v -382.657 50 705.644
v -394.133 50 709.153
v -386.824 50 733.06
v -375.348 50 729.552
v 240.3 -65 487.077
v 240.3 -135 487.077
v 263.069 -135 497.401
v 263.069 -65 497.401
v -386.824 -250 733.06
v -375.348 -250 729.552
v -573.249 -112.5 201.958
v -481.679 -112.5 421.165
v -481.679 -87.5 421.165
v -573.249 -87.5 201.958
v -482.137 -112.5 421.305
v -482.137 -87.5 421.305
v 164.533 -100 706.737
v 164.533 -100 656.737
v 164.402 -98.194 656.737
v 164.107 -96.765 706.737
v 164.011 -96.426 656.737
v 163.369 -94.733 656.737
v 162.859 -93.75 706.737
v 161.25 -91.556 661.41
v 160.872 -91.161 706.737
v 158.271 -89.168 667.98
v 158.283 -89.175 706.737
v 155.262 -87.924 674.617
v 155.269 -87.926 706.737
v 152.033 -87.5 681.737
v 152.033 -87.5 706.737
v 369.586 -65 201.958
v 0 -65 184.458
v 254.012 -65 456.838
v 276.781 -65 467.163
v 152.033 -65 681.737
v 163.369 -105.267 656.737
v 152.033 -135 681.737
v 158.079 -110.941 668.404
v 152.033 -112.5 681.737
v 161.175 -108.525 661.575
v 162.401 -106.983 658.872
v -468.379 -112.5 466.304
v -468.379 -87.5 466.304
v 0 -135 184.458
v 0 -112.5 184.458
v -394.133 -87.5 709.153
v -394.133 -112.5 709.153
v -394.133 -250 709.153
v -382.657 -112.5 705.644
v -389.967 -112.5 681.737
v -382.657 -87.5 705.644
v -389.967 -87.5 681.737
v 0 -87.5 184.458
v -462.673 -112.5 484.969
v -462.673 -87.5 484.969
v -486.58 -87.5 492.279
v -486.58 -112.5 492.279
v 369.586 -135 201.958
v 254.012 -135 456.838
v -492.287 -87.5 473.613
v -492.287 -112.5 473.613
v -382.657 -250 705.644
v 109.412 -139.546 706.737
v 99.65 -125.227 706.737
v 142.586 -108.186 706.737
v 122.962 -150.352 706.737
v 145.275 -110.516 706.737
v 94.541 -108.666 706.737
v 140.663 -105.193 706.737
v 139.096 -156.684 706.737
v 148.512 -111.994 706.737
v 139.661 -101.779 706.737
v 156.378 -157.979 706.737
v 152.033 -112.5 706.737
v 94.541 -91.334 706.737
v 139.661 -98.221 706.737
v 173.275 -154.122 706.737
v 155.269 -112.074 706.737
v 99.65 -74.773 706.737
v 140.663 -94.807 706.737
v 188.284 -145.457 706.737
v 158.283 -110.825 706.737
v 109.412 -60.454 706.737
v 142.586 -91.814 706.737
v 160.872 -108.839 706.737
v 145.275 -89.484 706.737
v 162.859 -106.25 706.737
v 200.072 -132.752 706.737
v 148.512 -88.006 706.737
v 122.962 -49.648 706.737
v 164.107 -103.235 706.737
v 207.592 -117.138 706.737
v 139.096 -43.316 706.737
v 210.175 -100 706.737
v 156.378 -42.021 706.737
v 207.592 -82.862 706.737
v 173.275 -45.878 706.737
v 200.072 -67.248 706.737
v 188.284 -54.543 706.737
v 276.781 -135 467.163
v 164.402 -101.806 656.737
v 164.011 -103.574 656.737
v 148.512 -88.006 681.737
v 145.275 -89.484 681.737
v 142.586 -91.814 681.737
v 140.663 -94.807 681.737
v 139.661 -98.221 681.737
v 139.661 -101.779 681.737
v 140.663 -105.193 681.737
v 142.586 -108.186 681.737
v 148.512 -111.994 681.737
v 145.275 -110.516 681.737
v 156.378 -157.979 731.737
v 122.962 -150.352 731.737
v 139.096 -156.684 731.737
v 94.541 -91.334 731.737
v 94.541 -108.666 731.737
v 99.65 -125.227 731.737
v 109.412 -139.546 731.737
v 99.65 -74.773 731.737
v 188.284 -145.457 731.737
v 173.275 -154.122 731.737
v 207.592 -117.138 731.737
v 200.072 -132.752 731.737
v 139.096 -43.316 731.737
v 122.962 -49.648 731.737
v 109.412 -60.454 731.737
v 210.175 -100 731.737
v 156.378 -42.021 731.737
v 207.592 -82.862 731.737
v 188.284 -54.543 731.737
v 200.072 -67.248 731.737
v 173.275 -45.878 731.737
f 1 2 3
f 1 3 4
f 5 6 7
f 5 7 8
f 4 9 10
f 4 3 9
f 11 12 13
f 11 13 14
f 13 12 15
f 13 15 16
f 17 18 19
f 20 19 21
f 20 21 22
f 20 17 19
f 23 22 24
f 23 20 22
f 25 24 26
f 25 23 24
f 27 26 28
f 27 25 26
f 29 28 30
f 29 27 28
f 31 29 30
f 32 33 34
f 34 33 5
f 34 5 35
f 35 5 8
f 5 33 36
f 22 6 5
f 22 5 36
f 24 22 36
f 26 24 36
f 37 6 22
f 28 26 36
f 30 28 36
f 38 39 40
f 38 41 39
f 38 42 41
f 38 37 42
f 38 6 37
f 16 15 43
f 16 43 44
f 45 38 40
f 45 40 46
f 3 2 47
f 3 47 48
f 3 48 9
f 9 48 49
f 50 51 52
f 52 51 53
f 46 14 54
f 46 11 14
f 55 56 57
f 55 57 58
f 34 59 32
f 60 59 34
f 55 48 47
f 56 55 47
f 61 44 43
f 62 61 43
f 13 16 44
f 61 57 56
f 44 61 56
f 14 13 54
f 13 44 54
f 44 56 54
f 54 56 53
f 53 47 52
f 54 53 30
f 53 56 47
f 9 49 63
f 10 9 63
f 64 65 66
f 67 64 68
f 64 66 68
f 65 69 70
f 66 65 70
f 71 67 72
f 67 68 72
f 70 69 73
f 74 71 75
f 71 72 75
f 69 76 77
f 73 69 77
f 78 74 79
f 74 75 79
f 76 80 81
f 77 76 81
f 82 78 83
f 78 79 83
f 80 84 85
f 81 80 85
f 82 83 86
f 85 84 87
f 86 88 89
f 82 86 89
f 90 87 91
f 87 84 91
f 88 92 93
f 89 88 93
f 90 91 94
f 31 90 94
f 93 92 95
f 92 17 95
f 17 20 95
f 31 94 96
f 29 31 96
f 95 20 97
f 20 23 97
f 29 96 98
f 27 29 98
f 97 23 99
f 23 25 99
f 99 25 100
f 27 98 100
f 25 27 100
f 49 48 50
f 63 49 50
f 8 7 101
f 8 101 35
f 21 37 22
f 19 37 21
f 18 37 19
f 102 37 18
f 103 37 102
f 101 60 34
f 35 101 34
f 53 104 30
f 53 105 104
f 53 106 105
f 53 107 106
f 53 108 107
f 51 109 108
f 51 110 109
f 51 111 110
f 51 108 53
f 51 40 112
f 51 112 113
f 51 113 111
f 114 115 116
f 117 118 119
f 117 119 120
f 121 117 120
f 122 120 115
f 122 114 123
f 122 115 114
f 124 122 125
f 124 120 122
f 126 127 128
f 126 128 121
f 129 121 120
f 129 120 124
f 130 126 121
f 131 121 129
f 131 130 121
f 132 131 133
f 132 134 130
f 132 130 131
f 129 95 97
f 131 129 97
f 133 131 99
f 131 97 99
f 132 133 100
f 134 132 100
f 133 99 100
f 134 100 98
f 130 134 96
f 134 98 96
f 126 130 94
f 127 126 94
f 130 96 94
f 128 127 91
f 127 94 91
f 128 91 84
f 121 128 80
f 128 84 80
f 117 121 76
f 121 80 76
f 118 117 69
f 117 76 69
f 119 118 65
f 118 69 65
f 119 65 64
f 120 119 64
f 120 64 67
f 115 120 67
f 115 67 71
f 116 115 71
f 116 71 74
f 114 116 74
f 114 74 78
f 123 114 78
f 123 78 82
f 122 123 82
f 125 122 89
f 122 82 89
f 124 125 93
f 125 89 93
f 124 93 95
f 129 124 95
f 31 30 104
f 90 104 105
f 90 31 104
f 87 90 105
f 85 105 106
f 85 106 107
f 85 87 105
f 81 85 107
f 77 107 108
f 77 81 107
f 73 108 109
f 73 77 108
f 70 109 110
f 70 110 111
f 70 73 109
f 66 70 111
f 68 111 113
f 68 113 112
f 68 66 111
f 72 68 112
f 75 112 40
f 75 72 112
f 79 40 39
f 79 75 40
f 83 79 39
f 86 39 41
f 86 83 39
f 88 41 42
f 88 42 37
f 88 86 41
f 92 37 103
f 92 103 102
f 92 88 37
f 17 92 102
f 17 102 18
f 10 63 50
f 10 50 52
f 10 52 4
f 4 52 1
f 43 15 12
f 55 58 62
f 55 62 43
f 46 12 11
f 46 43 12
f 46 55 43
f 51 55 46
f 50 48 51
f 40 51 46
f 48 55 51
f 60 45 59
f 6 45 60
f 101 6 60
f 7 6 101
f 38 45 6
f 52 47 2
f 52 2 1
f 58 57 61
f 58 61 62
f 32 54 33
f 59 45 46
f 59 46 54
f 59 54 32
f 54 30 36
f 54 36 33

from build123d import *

# Parameters (mm, degrees)
F2_DEPTH      = 12.5
F3_DEPTH      = 35
F5_DEPTH      = 25
F6_DEPTH      = 12
F7_DEPTH      = 116
F7_DEPTH_BACK = 25
F8_DEPTH      = 25
F9_W          = 12
F9_H          = 137.5
F9_H_2        = 25
F10_DEPTH     = 25
F11_W         = 70
F11_H         = 33.2023501396
F12_DEPTH     = 25
F13_DEPTH     = 12.5
F14_W         = 25
F14_H         = 19.5178985596
F15_DEPTH     = 25
F16_R         = 56.3233112178
F16_R_2       = 12.5
F17_DEPTH     = 25
F19_R         = 58.1415954248
F20_DEPTH     = 25


with BuildPart() as f2:
    # F1 (on offset) → F2 (new body, symmetric)
    with BuildSketch(Plane.XZ.offset(100)):
        Polygon((-436.7461862998, 528.7278605353), (0, 184.4581483886), (152.0332864558, 681.7366214894), (-389.9667135442, 681.7366214894), align=None)
    extrude(amount=F2_DEPTH, both=True)

    # F1 (on offset) → F3 (join, symmetric)
    with BuildSketch(Plane.XZ.offset(100)):
        with BuildLine():
            Line((152.0332864558, 681.7366214894), (0, 184.4581483886))
            Line((0, 184.4581483886), (75.4155046728, 188.0290943346))
            ThreePointArc((75.4155046728, 188.0290943346), (118.345751191, 355.6091461552), (247.9658580263, 470.1722629873))
            Line((247.9658580263, 470.1722629873), (152.0332864558, 681.7366214894))
        make_face()
        with BuildLine():
            ThreePointArc((247.9658580263, 470.1722629873), (118.345751191, 355.6091461552), (75.4155046728, 188.0290943346))
            Line((75.4155046728, 188.0290943346), (369.5859169395, 201.9581483886))
            Line((369.5859169395, 201.9581483886), (247.9658580263, 470.1722629873))
        make_face()
    extrude(amount=F3_DEPTH, both=True)

    # F4 (on face) → F5 (join, symmetric)
    with BuildSketch(Plane.XY.offset(681.7366214894)):
        with BuildLine():
            Line((152.0332864558, -112.5), (152.0332864558, -87.5))
            ThreePointArc((152.0332864558, -87.5), (139.5332864558, -100), (152.0332864558, -112.5))
        make_face()
        with BuildLine():
            ThreePointArc((152.0332864558, -112.5), (160.8721212207, -108.8388347648), (164.5332864558, -100))
            ThreePointArc((164.5332864558, -100), (160.8721212207, -91.1611652352), (152.0332864558, -87.5))
            Line((152.0332864558, -87.5), (152.0332864558, -112.5))
        make_face()
    extrude(amount=F5_DEPTH, both=True)

    # F6 (add): a face of the model
    f6_faces = [f2.faces().sort_by_distance(p)[0] for p in [
        (-413.356449922, -100, 605.2322410124),
    ]]
    extrude(f6_faces, amount=F6_DEPTH)

    # F7 (add, two sides): a face of the model
    f7_faces = [f2.faces().sort_by_distance(p)[0] for p in [
        (-442.4840148356, -100, 530.4820907636),
    ]]
    extrude(f7_faces, amount=F7_DEPTH)
    extrude(f7_faces, amount=-F7_DEPTH_BACK)

    # F8 (add): a face of the model
    f8_faces = [f2.faces().sort_by_distance(p)[0] for p in [
        (-395.70454208, -100, 683.4908517177),
    ]]
    extrude(f8_faces, amount=F8_DEPTH)

    # F9 (on face) → F10 (join)
    with BuildSketch(Plane(origin=(164.5856050194, 0, 538.3352571426), x_dir=(0.956304756, 0, -0.2923717047), z_dir=(0.2923717047, 0, 0.956304756))):
        with Locations((-578.2475210263, -181.25)):
            Rectangle(F9_W, F9_H)
        with Locations((-578.2475210263, -18.75)):
            Rectangle(F9_W, F9_H)
        with Locations((-578.2475210263, -100)):
            Rectangle(F9_W, F9_H_2)
    extrude(amount=F10_DEPTH)

    # F11 (on face) → F12 (join)
    with BuildSketch(Plane(origin=(382.5134832971, 0, 173.4484124494), x_dir=(0, 1, 0), z_dir=(0.9107440224, 0, 0.4129713376))):
        with Locations((-100, 327.7641832829)):
            Rectangle(F11_W, F11_H)
    extrude(amount=F12_DEPTH)

    # F1 (on offset) → F13 (join, symmetric)
    with BuildSketch(Plane.XZ.offset(100)):
        with BuildLine():
            Line((-573.2489245515, 201.9581483886), (-278.8860573945, 192.9719122971))
            ThreePointArc((-278.8860573945, 192.9719122971), (-278.783209758, 197.4645072005), (-278.7489245515, 201.9581483886))
            ThreePointArc((-278.7489245515, 201.9581483886), (-328.1359004952, 365.2059827937), (-459.7326626701, 473.7012408279))
            Line((-459.7326626701, 473.7012408279), (-573.2489245515, 201.9581483886))
        make_face()
        with BuildLine():
            Line((-278.8860573945, 192.9719122971), (0, 184.4581483886))
            Line((0, 184.4581483886), (-436.7461862998, 528.7278605353))
            Line((-436.7461862998, 528.7278605353), (-459.7326626701, 473.7012408279))
            ThreePointArc((-459.7326626701, 473.7012408279), (-328.1359004952, 365.2059827937), (-278.7489245515, 201.9581483886))
            ThreePointArc((-278.7489245515, 201.9581483886), (-278.783209758, 197.4645072005), (-278.8860573945, 192.9719122971))
        make_face()
    extrude(amount=F13_DEPTH, both=True)

    # F14 (on face) → F15 (join)
    with BuildSketch(Plane(origin=(-558.7186830171, 0, 170.8174437025), x_dir=(0, -1, 0), z_dir=(-0.956304756, 0, 0.2923717047))):
        with Locations((100, 318.746984005)):
            Rectangle(F14_W, F14_H)
    extrude(amount=F15_DEPTH)

    # F19 (on face) → F20 (join)
    with BuildSketch(Plane.XY.offset(706.7366214894)):
        with Locations((152.0332864558, -100)):
            Circle(F19_R)
    extrude(amount=F20_DEPTH)


with BuildPart() as f17:
    # F16 (on face) → F17 (new body)
    with BuildSketch(Plane.XY.offset(706.7366214894)):
        with Locations((152.0332864558, -100)):
            Circle(F16_R)
        with Locations((152.0332864558, -100)):
            Circle(F16_R_2, mode=Mode.SUBTRACT)
    extrude(amount=F17_DEPTH)


solid = f2.part
